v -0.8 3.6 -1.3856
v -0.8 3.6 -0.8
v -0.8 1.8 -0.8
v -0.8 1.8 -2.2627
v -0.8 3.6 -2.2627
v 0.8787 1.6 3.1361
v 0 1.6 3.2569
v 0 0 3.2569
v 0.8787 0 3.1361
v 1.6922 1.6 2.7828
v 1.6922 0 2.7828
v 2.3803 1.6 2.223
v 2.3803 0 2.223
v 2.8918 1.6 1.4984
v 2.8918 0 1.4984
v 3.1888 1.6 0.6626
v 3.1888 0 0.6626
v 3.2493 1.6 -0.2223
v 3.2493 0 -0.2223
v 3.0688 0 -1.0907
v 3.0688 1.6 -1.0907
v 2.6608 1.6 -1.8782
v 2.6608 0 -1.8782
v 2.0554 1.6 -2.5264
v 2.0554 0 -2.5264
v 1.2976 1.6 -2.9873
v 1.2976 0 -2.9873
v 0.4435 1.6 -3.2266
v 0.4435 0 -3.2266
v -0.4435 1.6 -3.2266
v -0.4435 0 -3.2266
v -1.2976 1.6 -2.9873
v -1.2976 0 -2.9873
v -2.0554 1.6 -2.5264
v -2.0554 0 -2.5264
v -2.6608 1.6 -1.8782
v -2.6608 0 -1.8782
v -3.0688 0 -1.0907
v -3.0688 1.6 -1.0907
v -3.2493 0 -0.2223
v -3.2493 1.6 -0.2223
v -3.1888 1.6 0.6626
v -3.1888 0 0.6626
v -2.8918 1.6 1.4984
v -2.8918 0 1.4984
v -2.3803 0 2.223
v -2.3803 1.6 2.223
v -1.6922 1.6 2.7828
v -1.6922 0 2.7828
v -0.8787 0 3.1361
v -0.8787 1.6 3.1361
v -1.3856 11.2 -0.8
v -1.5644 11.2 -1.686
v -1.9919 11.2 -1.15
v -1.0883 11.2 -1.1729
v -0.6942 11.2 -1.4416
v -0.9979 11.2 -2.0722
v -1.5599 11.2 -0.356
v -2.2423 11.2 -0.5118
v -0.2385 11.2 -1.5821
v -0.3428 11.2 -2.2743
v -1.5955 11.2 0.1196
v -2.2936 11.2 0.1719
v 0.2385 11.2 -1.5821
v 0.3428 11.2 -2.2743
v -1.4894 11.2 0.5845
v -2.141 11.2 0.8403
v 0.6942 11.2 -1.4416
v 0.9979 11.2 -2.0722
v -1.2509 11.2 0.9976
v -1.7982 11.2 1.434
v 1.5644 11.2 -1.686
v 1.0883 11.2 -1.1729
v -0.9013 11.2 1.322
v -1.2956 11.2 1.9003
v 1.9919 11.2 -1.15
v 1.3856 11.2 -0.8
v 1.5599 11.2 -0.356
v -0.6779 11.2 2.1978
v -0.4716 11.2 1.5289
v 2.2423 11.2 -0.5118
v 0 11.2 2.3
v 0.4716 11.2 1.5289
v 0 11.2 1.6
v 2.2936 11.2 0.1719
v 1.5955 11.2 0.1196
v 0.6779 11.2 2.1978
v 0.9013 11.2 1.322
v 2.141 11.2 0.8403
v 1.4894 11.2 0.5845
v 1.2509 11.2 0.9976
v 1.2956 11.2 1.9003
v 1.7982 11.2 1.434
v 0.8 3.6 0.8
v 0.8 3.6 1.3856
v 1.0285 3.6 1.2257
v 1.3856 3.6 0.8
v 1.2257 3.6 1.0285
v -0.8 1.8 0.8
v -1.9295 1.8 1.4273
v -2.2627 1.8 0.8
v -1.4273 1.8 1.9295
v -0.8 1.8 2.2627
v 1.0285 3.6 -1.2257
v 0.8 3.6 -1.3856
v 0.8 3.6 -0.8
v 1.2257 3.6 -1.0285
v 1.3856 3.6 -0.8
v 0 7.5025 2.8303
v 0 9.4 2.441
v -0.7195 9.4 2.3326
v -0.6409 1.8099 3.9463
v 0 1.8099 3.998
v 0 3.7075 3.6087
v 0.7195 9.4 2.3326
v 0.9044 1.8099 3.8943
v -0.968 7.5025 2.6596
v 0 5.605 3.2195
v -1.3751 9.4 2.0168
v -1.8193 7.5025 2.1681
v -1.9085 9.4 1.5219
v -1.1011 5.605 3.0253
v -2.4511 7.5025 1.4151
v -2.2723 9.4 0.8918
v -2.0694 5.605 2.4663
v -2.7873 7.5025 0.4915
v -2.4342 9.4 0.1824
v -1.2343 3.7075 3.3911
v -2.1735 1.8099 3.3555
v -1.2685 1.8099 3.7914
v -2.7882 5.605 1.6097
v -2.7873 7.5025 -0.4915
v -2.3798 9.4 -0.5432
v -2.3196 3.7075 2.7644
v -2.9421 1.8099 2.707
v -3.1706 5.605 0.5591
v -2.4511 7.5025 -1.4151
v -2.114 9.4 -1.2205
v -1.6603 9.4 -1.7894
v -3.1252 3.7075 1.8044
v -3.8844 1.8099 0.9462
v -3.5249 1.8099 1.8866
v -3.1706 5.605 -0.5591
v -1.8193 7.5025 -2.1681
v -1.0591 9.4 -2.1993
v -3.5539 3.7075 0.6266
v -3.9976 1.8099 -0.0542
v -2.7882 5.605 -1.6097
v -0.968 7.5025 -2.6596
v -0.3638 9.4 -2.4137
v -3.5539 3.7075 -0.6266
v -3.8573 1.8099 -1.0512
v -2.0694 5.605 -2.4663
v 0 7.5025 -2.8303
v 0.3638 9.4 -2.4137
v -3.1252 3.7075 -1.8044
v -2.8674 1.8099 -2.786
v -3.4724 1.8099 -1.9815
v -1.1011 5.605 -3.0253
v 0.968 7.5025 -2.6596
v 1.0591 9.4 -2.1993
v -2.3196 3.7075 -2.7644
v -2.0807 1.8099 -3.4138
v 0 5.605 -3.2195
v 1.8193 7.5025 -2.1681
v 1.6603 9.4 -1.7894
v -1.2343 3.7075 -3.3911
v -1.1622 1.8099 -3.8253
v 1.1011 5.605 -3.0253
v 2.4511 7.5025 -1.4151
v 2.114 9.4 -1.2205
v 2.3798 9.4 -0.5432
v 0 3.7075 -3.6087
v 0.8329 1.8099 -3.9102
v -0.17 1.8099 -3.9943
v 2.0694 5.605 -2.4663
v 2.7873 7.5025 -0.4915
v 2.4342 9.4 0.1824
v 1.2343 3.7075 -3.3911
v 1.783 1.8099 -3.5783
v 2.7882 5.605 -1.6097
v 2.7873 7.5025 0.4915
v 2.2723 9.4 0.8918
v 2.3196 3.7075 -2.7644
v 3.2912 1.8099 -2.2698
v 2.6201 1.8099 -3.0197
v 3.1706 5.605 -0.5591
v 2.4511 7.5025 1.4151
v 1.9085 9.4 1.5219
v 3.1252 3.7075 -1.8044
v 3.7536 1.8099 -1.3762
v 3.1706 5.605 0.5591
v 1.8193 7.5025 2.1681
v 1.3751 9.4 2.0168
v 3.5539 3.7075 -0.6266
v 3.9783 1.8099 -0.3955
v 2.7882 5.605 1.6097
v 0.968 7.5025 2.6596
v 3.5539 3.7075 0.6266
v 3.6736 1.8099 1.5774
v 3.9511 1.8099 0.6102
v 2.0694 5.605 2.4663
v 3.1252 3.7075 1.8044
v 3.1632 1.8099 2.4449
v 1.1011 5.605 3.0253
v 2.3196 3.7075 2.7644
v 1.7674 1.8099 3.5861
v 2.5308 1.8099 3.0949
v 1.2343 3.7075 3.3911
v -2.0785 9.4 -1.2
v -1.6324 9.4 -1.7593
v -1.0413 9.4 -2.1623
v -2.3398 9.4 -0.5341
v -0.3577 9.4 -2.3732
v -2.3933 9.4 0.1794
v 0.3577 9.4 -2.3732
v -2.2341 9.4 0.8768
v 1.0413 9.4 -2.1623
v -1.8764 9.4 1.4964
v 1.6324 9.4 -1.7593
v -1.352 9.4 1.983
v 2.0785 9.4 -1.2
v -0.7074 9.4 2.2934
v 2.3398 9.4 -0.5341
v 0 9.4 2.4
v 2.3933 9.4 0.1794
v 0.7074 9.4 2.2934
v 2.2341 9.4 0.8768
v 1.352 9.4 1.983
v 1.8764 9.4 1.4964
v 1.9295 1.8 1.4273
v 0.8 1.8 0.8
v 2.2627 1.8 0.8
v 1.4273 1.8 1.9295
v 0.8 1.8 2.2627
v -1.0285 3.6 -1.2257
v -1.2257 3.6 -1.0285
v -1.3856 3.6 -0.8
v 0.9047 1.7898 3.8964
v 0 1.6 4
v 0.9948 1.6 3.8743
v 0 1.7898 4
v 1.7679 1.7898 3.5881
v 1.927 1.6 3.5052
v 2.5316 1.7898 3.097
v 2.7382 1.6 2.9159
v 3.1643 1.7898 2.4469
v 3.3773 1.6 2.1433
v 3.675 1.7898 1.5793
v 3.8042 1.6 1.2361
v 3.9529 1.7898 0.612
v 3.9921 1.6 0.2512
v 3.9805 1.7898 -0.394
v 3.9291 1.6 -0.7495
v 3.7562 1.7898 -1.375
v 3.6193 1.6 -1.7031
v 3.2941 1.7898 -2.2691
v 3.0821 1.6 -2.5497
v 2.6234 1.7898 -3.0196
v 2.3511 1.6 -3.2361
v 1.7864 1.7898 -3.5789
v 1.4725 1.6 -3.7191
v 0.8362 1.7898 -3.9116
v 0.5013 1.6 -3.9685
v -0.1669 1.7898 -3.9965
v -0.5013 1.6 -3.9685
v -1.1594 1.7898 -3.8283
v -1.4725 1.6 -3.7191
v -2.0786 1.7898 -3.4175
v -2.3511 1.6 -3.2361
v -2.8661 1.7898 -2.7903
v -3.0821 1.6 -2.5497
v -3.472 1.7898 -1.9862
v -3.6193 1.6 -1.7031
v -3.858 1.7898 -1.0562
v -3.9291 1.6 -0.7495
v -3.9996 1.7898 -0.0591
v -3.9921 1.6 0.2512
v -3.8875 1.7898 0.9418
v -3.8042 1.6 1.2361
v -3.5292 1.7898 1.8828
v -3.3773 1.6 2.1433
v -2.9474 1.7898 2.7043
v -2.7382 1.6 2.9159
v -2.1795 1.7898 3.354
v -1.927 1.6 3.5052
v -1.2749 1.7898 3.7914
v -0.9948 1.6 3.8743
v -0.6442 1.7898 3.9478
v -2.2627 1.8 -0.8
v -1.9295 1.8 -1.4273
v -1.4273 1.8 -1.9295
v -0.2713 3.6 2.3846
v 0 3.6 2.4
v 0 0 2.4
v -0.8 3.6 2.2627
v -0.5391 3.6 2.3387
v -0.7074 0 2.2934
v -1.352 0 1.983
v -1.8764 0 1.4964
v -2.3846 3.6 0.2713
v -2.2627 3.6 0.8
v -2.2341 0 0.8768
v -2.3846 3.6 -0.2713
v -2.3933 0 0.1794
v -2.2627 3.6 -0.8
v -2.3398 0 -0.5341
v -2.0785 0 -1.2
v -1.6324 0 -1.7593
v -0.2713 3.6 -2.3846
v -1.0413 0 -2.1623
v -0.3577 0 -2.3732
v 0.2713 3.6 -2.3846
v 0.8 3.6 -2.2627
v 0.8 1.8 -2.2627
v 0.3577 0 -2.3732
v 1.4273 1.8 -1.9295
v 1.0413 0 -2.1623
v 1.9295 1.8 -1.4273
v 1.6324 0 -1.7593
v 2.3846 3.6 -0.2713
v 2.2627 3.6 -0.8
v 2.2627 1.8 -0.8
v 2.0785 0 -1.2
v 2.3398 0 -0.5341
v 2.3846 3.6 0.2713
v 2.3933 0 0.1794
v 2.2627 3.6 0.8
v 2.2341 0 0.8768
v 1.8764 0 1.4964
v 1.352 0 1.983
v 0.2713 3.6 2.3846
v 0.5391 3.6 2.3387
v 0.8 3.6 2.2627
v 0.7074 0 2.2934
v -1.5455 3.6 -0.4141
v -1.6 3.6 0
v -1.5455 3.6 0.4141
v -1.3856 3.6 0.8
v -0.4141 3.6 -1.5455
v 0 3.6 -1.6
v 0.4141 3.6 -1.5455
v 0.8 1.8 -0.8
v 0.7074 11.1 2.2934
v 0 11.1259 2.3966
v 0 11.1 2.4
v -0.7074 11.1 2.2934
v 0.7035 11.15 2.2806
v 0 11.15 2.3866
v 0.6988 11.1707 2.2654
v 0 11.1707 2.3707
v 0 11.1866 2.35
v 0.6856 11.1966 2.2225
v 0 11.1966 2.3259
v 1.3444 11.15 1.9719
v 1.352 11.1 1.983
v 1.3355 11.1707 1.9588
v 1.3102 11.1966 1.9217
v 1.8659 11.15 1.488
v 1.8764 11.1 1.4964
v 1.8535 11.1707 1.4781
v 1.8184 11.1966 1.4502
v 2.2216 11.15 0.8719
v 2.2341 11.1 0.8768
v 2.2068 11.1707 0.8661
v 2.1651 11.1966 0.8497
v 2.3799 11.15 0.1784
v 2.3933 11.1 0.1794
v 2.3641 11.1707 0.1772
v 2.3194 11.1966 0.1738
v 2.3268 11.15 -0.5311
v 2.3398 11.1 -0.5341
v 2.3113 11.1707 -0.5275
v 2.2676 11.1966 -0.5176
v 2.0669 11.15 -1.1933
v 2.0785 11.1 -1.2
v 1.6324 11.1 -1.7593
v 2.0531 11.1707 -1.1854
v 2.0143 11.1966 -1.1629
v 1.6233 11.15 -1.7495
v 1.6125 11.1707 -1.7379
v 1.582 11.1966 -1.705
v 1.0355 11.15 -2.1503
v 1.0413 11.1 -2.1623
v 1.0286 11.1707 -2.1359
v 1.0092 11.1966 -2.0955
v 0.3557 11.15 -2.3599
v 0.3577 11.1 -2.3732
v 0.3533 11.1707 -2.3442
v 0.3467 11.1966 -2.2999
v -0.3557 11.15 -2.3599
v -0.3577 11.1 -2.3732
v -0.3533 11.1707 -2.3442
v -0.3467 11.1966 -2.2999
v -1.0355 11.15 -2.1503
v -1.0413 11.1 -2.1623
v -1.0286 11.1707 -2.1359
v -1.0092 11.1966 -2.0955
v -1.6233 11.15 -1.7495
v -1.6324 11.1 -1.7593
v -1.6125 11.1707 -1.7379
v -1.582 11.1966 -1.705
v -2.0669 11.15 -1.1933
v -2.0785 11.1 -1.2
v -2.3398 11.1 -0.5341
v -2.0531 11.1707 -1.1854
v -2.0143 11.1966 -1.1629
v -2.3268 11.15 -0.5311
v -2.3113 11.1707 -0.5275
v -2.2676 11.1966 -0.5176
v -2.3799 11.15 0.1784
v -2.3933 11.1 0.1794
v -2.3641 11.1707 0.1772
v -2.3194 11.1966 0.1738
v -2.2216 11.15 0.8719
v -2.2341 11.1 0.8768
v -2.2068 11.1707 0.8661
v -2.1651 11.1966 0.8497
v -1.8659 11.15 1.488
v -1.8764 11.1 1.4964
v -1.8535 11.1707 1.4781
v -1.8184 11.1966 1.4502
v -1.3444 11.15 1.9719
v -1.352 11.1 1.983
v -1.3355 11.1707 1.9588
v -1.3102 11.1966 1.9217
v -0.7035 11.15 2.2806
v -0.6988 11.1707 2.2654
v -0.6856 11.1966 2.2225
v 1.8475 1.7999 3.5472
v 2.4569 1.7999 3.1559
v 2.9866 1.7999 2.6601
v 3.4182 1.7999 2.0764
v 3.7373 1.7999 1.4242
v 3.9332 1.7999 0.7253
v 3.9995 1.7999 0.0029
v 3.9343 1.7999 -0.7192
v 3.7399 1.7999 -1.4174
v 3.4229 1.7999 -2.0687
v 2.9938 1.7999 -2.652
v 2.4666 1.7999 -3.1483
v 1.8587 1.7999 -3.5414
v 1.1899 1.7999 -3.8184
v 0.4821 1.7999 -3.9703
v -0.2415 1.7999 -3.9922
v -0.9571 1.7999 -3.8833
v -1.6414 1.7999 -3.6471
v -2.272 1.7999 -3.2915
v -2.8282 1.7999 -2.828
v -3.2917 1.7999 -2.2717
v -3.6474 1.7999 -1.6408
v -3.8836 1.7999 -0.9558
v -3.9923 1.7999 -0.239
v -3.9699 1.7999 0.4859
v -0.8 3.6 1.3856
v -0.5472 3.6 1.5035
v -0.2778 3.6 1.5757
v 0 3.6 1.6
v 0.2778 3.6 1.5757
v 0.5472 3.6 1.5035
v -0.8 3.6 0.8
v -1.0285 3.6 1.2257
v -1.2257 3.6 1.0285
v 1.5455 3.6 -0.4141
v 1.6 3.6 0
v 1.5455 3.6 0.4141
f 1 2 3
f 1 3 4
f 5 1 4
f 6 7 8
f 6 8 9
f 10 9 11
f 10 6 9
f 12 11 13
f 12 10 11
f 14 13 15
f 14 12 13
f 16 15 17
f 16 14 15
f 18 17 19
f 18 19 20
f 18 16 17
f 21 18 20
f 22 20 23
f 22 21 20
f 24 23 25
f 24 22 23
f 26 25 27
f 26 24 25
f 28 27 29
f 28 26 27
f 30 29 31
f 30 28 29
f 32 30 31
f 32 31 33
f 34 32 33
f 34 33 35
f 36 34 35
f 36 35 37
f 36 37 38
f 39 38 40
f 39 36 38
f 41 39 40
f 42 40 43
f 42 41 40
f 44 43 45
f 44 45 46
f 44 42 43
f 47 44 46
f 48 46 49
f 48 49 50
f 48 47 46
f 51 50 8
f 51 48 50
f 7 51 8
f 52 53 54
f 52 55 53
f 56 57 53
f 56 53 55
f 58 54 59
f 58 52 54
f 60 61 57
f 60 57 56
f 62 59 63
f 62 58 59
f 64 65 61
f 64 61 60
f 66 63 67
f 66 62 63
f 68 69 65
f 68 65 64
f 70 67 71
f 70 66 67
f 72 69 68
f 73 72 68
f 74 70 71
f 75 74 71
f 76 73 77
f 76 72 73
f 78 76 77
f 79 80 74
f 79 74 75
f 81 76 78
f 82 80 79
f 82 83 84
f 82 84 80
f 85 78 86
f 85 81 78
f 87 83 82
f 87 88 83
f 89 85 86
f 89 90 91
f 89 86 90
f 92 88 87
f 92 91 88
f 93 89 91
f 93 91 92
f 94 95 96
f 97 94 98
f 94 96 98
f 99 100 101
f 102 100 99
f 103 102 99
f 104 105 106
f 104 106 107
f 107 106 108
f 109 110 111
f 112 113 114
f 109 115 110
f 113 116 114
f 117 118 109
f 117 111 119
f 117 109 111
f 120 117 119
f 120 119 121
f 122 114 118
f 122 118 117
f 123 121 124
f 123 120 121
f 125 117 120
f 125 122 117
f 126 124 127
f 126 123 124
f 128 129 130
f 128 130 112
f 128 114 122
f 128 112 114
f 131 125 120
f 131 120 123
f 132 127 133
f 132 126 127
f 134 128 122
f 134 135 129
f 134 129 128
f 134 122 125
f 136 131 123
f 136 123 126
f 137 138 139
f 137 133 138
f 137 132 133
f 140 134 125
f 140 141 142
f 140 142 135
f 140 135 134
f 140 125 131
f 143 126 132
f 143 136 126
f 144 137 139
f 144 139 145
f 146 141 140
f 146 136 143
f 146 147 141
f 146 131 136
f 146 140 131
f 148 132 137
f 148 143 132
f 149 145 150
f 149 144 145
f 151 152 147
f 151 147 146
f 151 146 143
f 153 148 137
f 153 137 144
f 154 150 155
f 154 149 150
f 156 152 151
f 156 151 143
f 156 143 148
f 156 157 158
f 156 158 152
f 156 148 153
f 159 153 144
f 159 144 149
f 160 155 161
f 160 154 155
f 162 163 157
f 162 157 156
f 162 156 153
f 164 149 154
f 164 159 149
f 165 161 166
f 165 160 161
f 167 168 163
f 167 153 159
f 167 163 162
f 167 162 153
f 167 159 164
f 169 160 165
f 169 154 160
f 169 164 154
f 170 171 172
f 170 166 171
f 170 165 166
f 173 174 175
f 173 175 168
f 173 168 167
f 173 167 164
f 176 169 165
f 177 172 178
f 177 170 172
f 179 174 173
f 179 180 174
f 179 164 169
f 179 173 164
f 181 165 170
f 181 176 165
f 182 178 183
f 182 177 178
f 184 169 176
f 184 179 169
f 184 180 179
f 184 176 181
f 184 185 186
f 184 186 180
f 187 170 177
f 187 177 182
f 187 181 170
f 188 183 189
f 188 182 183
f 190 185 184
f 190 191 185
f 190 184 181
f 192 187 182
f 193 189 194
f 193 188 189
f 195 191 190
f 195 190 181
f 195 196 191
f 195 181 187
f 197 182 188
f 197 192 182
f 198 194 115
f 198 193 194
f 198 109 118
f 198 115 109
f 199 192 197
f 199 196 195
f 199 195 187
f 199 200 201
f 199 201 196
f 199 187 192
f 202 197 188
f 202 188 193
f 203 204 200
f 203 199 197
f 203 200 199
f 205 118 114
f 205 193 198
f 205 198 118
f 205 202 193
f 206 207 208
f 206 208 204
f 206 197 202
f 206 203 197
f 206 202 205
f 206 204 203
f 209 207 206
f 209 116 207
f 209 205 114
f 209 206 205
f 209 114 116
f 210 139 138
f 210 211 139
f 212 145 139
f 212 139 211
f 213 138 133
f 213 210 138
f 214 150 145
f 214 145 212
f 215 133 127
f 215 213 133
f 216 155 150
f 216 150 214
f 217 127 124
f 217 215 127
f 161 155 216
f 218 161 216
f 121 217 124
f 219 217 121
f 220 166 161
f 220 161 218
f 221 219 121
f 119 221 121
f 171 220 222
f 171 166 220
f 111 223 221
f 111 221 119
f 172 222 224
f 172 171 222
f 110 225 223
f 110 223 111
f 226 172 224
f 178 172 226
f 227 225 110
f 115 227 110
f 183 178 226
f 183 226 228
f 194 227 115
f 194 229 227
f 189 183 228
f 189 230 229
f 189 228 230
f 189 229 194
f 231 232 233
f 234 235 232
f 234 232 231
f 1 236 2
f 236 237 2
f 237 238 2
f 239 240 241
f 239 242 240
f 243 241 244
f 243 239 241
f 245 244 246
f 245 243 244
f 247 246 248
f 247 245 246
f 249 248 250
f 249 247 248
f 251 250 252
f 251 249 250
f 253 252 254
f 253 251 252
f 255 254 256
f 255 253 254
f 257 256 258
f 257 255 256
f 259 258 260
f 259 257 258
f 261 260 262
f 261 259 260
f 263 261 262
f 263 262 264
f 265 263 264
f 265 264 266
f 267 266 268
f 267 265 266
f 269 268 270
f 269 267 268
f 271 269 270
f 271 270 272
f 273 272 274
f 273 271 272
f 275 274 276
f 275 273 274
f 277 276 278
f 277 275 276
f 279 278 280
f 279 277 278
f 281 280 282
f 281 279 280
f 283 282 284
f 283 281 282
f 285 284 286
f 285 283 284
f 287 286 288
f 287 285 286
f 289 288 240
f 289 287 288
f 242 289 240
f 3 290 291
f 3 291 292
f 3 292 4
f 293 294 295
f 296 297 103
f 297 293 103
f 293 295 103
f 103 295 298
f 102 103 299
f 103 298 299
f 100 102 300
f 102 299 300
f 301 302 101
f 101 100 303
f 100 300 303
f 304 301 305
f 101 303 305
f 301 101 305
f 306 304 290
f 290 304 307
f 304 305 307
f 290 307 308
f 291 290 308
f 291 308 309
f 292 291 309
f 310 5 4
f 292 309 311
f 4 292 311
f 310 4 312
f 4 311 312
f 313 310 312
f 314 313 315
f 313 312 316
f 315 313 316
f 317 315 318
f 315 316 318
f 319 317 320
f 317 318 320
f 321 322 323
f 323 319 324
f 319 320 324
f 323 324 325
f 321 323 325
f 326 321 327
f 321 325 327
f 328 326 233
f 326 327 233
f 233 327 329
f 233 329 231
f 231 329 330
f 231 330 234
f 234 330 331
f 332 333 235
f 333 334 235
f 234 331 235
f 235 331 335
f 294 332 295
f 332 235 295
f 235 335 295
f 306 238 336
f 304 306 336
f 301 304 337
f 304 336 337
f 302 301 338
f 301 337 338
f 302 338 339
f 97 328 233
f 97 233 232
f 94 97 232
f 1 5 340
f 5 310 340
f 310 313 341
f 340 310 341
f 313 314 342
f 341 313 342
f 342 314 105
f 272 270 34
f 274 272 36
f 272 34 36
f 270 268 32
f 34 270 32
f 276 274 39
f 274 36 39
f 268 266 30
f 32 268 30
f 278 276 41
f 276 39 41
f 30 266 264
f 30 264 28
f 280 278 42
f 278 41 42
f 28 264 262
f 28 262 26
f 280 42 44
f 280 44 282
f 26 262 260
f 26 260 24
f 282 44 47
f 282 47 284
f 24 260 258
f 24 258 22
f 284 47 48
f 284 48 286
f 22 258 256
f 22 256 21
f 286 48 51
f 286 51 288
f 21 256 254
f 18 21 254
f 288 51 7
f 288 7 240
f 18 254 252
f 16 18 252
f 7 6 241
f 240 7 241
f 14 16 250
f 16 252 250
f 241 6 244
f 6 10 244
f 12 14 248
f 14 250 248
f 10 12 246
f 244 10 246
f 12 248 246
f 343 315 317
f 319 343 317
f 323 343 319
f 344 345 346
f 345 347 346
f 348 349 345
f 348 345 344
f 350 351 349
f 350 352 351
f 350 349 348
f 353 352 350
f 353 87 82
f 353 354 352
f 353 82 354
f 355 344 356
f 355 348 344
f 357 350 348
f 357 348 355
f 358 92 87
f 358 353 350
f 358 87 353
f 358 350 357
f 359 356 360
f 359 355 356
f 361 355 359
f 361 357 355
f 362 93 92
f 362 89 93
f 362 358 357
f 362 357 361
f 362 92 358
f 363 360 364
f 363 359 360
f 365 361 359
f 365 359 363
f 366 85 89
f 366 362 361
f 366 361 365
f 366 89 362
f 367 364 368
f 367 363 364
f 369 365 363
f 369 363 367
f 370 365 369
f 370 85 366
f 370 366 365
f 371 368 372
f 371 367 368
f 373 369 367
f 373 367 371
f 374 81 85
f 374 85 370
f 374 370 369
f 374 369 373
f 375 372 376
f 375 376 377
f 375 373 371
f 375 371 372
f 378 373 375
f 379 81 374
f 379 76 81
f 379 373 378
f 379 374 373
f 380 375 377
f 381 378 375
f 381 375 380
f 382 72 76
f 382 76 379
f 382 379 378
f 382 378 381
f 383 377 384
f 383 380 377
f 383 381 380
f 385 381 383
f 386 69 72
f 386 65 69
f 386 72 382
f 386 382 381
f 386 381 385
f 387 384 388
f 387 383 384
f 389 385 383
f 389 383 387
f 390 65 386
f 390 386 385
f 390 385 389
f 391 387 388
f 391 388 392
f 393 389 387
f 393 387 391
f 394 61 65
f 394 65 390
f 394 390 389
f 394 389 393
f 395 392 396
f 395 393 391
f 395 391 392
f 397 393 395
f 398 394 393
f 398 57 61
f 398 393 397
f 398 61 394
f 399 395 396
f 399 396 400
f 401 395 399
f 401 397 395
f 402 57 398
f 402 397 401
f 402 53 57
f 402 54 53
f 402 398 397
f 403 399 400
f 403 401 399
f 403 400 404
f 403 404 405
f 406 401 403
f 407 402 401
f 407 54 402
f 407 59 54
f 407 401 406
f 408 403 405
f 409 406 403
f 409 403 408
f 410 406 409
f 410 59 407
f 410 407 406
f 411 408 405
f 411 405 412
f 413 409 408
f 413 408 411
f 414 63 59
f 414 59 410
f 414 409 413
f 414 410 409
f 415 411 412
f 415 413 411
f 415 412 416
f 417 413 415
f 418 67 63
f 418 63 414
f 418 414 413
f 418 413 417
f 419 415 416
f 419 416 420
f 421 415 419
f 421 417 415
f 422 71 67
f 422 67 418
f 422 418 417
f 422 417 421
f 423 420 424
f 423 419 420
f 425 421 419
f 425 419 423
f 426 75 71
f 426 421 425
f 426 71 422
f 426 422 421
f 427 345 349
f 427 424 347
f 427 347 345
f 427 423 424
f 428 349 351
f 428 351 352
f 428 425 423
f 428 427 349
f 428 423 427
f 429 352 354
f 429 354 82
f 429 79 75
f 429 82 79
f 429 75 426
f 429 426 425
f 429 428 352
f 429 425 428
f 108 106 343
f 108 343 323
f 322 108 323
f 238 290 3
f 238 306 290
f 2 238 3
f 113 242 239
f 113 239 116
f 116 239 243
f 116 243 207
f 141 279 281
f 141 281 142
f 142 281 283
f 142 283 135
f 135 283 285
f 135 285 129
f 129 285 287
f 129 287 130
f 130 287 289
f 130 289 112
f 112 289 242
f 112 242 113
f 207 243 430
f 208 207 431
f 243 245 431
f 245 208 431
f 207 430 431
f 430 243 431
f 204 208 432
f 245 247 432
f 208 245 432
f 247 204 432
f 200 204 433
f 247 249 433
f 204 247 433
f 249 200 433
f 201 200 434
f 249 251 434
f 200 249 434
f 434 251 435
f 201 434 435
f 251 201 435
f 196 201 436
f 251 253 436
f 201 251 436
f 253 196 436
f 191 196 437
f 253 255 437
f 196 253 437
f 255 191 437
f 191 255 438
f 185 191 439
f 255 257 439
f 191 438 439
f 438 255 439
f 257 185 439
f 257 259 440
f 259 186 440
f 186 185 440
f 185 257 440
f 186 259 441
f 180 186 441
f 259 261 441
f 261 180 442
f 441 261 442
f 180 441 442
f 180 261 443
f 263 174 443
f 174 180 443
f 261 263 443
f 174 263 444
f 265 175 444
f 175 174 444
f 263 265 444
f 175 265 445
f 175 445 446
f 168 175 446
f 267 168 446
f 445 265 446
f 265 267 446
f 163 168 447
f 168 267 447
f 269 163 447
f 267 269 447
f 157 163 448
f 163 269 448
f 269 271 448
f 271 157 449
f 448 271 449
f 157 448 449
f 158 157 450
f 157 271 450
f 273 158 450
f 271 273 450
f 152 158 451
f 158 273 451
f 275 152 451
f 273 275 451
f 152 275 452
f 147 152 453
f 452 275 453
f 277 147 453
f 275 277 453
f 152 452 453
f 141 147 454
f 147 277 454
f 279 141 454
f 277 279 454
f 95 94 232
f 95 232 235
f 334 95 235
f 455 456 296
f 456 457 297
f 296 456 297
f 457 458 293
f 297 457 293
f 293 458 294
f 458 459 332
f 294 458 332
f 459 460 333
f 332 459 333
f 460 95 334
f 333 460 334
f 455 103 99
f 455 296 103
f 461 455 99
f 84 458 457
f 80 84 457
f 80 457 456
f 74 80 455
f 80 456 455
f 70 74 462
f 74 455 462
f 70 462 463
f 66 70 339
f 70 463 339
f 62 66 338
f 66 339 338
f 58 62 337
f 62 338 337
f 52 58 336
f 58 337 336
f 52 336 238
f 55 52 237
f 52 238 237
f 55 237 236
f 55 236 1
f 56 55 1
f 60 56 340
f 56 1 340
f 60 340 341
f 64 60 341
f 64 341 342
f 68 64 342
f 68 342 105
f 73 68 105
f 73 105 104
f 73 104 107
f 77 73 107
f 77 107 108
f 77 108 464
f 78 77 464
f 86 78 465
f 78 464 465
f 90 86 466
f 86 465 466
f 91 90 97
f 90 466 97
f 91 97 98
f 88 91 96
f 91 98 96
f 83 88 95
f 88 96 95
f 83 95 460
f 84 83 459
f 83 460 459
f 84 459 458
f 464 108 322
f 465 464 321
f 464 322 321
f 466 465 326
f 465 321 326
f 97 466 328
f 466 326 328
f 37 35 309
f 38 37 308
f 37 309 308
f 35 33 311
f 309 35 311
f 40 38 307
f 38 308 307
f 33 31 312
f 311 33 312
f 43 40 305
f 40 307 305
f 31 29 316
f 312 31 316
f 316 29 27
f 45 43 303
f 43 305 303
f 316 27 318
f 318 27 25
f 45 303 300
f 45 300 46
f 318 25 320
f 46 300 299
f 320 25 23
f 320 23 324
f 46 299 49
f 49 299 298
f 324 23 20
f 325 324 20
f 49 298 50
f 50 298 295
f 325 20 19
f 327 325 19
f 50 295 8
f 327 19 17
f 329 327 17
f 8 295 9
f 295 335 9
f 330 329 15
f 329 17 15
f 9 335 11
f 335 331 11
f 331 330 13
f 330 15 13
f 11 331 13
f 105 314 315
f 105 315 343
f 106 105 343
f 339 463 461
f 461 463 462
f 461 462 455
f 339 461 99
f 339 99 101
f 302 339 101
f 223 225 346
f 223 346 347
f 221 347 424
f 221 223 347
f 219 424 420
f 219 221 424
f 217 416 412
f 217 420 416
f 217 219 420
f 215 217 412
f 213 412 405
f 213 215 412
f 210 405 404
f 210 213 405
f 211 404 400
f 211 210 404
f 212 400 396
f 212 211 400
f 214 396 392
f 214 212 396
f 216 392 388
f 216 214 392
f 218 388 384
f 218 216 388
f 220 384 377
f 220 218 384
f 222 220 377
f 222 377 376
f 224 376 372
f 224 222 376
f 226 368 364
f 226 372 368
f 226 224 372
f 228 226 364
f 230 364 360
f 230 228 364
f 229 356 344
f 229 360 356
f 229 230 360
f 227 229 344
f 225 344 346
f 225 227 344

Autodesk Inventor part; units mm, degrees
ref_plane "YZ Plane" through (0, 0, 0) normal (1, 0, 0) x (0, 1, 0)
ref_plane "XZ Plane" through (0, 0, 0) normal (0, 1, 0) x (-1, 0, 0)
ref_plane "XY Plane" through (0, 0, 0) normal (0, 0, 1) x (1, 0, 0)
sketch "Sketch11" plane through (0, 0, 0) normal (1, 0, 0) x (0, 1, 0)
  line L0 (0, 3.2569) -> (1.6, 3.2569)
  line L1 (1.6, 4) -> (1.8, 4)
  line L2 (-2.24, 0) -> (13.44, 0) projected
  line L3 (1.6, 3.2569) -> (1.6, 4)
  line L4 (1.8, 4) -> (9.6, 2.4)
  line L5 (9.6, 2.4) -> (11.2, 2.4)
  line L6 (11.2, 2.4) -> (11.2, 1.6)
  line L7 (11.2, 1.6) -> (3.6, 1.6)
  line L8 (3.6, 1.6) -> (3.6, 2.4)
  line L9 (3.6, 2.4) -> (0, 2.4)
  line L10 (0, 2.4) -> (0, 3.2569)
  line L11 (9.6, 2.4) -> (9.4, 2.4)
  line L12 (9.4, 2.4) -> (9.4, 2.441)
  point P0 (0, 0)
  dimension "d99" = 4.8
  dimension "d100" = 1.6
  dimension "d101" = 6.5137
  dimension "d102" = 8
  dimension "d104" = 3.2
  dimension "d105" = 4.8
  dimension "d106" = 1.6
  dimension "d107" = 9.6
  dimension "d109" = 3.6
  dimension "d110" = 0.2
  dimension "d116" = 1.8
revolve "Revolution1" add sketch "Sketch11" angle 360 about axis through (0, -10, 0) along (0, 1, 0) contours L0 L3 L1 L4 L12 L11 L5 L6 L7 L8 L9 L10
fillet "Fillet1" radius 0.1 2 edges at (0, 11.2, -2.4) (0, 1.8, -4)
sketch "Sketch12" plane through (0, 3.6, 0) normal (0, -1, 0) x (1, 0, 0)
  circle A0 centre (0, 0) radius 2.4 projected
  line L0 (-0.8, 2.2627) -> (-0.8, 0.8)
  line L1 (-0.8, 0.8) -> (-2.2627, 0.8)
  line L2 (-2.2627, -0.8) -> (-0.8, -0.8)
  line L3 (-0.8, -0.8) -> (-0.8, -2.2627)
  line L4 (0.8, -2.2627) -> (0.8, -0.8)
  line L5 (0.8, -0.8) -> (2.2627, -0.8)
  line L6 (2.2627, 0.8) -> (0.8, 0.8)
  line L7 (0.8, 0.8) -> (0.8, 2.2627)
  dimension "d111" = 1.6
extrude "Extrusion7" add sketch "Sketch12" along normal blind 1.8 contours L6 L7 A0 | A0 L4 L5 | L0 L1 A0 | A0 L2 L3
equation "\"d99\" = kd"
equation "\"d100\" = 0.333333 * lh - topthk"
equation "\"d101\" = tubeod"
equation "\"d102\" = lu"
equation "\"d104\" = rd"
equation "\"d105\" = kd"
equation "\"d106\" = knobh"
equation "\"d107\" = lh"
equation "\"d22\" = lf"
equation "\"d111\" = axlet"
equation "\"kd\" = 4.8"
equation "\"lh\" = 9.6"
equation "\"topthk\" = 1.6"
equation "\"tubeod\" = 6.513708"
equation "\"lu\" = 8"
equation "\"rd\" = 3.2"
equation "\"knobh\" = 1.6"
equation "\"lf\" = 0.1"
equation "\"axlet\" = 1.6"
properties part number "59900-Black" material "ABS Plastic"
